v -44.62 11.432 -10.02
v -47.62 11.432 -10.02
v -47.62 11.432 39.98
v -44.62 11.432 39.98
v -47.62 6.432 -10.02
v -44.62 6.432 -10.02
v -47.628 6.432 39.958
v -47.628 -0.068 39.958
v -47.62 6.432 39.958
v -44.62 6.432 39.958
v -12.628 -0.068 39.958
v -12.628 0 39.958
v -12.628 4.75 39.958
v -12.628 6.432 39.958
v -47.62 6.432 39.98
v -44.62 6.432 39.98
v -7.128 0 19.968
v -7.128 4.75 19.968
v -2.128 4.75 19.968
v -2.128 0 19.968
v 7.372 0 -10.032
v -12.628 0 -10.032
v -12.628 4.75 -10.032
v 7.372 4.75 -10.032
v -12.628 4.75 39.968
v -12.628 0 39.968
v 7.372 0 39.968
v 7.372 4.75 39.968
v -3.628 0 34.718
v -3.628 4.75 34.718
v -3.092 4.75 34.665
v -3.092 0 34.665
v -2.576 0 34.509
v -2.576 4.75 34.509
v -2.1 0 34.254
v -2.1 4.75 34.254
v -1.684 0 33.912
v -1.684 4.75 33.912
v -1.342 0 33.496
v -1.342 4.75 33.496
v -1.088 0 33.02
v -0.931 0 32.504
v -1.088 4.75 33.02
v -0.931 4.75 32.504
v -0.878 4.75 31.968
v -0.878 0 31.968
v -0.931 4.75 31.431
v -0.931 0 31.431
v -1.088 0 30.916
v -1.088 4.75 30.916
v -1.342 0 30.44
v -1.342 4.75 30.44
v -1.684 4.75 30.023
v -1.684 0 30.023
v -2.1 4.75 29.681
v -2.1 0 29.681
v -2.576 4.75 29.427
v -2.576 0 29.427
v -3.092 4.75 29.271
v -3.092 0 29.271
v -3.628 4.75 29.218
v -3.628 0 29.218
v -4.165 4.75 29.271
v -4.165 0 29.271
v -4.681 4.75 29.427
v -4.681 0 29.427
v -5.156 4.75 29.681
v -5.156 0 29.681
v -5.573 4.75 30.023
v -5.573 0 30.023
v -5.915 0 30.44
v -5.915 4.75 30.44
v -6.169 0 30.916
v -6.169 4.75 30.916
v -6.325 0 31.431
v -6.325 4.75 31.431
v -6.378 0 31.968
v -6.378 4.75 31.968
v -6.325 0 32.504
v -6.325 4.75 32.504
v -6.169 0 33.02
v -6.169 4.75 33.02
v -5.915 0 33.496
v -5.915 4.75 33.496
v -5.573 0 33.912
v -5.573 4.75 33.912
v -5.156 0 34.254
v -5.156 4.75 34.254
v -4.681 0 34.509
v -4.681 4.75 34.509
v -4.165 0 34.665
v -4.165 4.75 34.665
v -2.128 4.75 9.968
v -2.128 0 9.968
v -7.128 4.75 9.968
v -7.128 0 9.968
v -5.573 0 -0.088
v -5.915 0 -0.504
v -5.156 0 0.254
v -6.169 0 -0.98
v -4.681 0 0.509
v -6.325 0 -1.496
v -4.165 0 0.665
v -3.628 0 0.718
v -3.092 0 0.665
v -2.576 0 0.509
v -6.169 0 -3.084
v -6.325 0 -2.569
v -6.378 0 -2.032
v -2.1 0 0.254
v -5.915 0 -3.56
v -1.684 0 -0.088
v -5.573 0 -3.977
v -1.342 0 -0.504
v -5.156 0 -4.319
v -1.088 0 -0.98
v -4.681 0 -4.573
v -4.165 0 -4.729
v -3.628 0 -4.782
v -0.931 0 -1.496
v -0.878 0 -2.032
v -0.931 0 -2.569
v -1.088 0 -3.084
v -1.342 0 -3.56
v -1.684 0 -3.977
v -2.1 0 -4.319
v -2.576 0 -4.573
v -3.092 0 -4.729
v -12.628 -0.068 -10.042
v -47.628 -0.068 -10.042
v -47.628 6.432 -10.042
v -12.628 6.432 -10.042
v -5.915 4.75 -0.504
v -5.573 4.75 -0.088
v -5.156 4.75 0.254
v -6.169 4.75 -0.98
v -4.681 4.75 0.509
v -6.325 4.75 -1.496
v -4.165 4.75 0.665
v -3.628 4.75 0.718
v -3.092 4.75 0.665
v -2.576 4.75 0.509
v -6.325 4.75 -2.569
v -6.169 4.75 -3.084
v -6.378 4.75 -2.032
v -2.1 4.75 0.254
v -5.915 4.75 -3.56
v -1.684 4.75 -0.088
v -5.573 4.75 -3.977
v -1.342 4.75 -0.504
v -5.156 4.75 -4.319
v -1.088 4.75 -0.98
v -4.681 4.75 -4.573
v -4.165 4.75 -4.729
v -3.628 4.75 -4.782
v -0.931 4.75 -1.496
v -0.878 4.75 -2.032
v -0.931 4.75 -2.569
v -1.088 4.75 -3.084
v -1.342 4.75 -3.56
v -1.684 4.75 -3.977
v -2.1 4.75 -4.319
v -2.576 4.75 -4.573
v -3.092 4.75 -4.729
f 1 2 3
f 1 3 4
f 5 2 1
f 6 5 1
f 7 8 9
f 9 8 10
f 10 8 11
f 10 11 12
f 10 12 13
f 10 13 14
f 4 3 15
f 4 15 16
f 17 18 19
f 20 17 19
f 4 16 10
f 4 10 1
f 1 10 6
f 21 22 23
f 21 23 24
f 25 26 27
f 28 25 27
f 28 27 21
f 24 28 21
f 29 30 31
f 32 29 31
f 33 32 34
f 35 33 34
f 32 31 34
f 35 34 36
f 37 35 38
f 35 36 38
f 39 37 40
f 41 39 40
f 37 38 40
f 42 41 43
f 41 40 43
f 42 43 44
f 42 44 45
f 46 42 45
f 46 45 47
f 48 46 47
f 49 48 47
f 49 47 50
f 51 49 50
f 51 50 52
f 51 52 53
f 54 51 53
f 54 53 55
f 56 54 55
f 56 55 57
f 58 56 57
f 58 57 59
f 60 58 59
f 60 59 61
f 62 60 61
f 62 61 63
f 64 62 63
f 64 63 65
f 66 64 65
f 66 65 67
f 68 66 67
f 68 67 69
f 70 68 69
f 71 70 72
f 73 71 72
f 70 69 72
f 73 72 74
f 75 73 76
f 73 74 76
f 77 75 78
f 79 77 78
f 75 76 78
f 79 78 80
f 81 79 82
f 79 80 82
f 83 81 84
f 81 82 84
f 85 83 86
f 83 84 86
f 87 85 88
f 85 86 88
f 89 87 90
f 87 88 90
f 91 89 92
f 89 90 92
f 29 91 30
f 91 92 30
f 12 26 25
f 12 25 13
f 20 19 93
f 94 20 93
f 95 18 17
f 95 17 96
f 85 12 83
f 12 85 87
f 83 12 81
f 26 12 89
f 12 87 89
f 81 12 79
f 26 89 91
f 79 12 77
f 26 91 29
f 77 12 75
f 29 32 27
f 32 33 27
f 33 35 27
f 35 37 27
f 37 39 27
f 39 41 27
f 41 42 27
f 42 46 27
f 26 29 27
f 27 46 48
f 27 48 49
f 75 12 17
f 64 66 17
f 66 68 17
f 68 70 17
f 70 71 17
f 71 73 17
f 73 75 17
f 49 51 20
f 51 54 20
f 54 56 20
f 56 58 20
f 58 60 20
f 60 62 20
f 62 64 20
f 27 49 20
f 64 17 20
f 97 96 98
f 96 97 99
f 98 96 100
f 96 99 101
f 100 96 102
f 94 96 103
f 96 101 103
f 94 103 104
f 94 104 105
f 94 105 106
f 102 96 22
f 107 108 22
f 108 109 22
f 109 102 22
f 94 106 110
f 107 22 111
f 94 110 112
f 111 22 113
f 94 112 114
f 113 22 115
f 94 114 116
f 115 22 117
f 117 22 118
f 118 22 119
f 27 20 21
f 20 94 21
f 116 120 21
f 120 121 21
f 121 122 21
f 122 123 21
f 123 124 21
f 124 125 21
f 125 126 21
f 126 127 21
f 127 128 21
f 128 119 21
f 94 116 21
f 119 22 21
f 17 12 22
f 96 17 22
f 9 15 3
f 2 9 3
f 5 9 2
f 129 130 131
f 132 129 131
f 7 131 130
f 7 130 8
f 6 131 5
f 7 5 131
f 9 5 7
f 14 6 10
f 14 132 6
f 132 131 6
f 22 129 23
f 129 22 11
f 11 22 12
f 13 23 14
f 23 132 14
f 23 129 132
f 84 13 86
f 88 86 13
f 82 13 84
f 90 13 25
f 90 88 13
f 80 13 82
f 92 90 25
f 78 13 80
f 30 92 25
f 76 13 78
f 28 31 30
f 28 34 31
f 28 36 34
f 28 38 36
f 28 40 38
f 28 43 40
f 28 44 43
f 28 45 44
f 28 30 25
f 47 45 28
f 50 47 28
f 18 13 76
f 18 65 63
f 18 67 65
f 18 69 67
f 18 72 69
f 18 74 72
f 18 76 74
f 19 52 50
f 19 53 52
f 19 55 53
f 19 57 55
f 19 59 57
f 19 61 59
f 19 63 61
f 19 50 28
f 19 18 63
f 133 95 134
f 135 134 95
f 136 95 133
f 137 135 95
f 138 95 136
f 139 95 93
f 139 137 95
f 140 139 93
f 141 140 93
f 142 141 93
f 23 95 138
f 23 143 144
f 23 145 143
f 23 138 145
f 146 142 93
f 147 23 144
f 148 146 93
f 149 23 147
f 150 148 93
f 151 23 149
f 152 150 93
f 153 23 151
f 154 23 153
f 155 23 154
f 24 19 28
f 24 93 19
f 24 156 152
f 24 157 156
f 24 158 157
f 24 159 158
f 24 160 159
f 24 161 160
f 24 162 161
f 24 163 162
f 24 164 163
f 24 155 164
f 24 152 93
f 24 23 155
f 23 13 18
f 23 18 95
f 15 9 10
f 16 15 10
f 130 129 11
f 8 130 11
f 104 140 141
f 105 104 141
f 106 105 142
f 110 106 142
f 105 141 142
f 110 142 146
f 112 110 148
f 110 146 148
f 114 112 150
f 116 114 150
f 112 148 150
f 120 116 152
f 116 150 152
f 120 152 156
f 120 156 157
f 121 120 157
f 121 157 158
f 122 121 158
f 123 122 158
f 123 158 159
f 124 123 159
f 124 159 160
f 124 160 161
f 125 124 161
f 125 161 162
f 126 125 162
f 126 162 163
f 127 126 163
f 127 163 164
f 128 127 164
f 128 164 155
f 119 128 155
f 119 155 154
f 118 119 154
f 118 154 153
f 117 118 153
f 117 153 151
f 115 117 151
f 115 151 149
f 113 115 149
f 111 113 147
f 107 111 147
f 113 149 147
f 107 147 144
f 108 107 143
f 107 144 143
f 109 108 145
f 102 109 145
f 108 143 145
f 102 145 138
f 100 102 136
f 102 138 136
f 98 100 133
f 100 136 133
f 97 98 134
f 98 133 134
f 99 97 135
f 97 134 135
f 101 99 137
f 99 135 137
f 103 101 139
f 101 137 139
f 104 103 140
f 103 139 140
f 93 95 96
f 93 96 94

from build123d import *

# Parameters (mm, degrees)
ESQUISSE2_W             = 20
ESQUISSE2_H             = 50
BOSS_EXTRU_1_DEPTH      = 4.75
ESQUISSE3_R             = 2.75
ENL_V_MAT_EXTRU_1_DEPTH = 43.183776378
ESQUISSE6_W             = 50
ESQUISSE6_H             = 6.5
BOSS_EXTRU_2_DEPTH      = 35
ESQUISSE7_W             = 3
ESQUISSE7_H             = 50
BOSS_EXTRU_3_DEPTH      = 5
ESQUISSE8_W             = 5
ESQUISSE8_H             = 10
ENL_V_MAT_EXTRU_2_DEPTH = 5.5


with BuildPart() as part:
    # Esquisse2 → Boss.-Extru.1 (new body)
    with BuildSketch(Plane(origin=(0, 0, 0), x_dir=(1, 0, 0), z_dir=(0, 1, 0))):
        with Locations((-2.628205128, -14.967948718)):
            Rectangle(ESQUISSE2_W, ESQUISSE2_H)
    extrude(amount=BOSS_EXTRU_1_DEPTH)

    # Esquisse3 → Enlèv. mat.-Extru.1 (cut, through all)
    with BuildSketch(Plane(origin=(0, 4.75, 0), x_dir=(1, 0, 0), z_dir=(0, 1, 0))):
        with Locations(Location((-3.628205128, 2.032051282, 0), (0, 0, 270))):
            Circle(ESQUISSE3_R)
        with Locations(Location((-3.628205128, -31.967948718, 0), (0, 0, 270))):
            Circle(ESQUISSE3_R)
    extrude(amount=-ENL_V_MAT_EXTRU_1_DEPTH, mode=Mode.SUBTRACT)

    # Esquisse6 → Boss.-Extru.2 (add)
    with BuildSketch(Plane.ZY.offset(12.628205128)):
        with Locations((14.958265228, 3.181677952)):
            Rectangle(ESQUISSE6_W, ESQUISSE6_H)
    extrude(amount=BOSS_EXTRU_2_DEPTH)

    # Esquisse7 → Boss.-Extru.3 (add)
    with BuildSketch(Plane(origin=(0, 6.431677952, 0), x_dir=(1, 0, 0), z_dir=(0, 1, 0))):
        with Locations((-46.119685934, -14.980159327)):
            Rectangle(ESQUISSE7_W, ESQUISSE7_H)
    extrude(amount=BOSS_EXTRU_3_DEPTH)

    # Esquisse8 → Enlèv. mat.-Extru.2 (cut)
    with BuildSketch(Plane(origin=(0, 4.75, 0), x_dir=(1, 0, 0), z_dir=(0, 1, 0))):
        with Locations((-4.628205128, -14.967948718)):
            Rectangle(ESQUISSE8_W, ESQUISSE8_H)
    extrude(amount=-ENL_V_MAT_EXTRU_2_DEPTH, mode=Mode.SUBTRACT)


solid = part.part
